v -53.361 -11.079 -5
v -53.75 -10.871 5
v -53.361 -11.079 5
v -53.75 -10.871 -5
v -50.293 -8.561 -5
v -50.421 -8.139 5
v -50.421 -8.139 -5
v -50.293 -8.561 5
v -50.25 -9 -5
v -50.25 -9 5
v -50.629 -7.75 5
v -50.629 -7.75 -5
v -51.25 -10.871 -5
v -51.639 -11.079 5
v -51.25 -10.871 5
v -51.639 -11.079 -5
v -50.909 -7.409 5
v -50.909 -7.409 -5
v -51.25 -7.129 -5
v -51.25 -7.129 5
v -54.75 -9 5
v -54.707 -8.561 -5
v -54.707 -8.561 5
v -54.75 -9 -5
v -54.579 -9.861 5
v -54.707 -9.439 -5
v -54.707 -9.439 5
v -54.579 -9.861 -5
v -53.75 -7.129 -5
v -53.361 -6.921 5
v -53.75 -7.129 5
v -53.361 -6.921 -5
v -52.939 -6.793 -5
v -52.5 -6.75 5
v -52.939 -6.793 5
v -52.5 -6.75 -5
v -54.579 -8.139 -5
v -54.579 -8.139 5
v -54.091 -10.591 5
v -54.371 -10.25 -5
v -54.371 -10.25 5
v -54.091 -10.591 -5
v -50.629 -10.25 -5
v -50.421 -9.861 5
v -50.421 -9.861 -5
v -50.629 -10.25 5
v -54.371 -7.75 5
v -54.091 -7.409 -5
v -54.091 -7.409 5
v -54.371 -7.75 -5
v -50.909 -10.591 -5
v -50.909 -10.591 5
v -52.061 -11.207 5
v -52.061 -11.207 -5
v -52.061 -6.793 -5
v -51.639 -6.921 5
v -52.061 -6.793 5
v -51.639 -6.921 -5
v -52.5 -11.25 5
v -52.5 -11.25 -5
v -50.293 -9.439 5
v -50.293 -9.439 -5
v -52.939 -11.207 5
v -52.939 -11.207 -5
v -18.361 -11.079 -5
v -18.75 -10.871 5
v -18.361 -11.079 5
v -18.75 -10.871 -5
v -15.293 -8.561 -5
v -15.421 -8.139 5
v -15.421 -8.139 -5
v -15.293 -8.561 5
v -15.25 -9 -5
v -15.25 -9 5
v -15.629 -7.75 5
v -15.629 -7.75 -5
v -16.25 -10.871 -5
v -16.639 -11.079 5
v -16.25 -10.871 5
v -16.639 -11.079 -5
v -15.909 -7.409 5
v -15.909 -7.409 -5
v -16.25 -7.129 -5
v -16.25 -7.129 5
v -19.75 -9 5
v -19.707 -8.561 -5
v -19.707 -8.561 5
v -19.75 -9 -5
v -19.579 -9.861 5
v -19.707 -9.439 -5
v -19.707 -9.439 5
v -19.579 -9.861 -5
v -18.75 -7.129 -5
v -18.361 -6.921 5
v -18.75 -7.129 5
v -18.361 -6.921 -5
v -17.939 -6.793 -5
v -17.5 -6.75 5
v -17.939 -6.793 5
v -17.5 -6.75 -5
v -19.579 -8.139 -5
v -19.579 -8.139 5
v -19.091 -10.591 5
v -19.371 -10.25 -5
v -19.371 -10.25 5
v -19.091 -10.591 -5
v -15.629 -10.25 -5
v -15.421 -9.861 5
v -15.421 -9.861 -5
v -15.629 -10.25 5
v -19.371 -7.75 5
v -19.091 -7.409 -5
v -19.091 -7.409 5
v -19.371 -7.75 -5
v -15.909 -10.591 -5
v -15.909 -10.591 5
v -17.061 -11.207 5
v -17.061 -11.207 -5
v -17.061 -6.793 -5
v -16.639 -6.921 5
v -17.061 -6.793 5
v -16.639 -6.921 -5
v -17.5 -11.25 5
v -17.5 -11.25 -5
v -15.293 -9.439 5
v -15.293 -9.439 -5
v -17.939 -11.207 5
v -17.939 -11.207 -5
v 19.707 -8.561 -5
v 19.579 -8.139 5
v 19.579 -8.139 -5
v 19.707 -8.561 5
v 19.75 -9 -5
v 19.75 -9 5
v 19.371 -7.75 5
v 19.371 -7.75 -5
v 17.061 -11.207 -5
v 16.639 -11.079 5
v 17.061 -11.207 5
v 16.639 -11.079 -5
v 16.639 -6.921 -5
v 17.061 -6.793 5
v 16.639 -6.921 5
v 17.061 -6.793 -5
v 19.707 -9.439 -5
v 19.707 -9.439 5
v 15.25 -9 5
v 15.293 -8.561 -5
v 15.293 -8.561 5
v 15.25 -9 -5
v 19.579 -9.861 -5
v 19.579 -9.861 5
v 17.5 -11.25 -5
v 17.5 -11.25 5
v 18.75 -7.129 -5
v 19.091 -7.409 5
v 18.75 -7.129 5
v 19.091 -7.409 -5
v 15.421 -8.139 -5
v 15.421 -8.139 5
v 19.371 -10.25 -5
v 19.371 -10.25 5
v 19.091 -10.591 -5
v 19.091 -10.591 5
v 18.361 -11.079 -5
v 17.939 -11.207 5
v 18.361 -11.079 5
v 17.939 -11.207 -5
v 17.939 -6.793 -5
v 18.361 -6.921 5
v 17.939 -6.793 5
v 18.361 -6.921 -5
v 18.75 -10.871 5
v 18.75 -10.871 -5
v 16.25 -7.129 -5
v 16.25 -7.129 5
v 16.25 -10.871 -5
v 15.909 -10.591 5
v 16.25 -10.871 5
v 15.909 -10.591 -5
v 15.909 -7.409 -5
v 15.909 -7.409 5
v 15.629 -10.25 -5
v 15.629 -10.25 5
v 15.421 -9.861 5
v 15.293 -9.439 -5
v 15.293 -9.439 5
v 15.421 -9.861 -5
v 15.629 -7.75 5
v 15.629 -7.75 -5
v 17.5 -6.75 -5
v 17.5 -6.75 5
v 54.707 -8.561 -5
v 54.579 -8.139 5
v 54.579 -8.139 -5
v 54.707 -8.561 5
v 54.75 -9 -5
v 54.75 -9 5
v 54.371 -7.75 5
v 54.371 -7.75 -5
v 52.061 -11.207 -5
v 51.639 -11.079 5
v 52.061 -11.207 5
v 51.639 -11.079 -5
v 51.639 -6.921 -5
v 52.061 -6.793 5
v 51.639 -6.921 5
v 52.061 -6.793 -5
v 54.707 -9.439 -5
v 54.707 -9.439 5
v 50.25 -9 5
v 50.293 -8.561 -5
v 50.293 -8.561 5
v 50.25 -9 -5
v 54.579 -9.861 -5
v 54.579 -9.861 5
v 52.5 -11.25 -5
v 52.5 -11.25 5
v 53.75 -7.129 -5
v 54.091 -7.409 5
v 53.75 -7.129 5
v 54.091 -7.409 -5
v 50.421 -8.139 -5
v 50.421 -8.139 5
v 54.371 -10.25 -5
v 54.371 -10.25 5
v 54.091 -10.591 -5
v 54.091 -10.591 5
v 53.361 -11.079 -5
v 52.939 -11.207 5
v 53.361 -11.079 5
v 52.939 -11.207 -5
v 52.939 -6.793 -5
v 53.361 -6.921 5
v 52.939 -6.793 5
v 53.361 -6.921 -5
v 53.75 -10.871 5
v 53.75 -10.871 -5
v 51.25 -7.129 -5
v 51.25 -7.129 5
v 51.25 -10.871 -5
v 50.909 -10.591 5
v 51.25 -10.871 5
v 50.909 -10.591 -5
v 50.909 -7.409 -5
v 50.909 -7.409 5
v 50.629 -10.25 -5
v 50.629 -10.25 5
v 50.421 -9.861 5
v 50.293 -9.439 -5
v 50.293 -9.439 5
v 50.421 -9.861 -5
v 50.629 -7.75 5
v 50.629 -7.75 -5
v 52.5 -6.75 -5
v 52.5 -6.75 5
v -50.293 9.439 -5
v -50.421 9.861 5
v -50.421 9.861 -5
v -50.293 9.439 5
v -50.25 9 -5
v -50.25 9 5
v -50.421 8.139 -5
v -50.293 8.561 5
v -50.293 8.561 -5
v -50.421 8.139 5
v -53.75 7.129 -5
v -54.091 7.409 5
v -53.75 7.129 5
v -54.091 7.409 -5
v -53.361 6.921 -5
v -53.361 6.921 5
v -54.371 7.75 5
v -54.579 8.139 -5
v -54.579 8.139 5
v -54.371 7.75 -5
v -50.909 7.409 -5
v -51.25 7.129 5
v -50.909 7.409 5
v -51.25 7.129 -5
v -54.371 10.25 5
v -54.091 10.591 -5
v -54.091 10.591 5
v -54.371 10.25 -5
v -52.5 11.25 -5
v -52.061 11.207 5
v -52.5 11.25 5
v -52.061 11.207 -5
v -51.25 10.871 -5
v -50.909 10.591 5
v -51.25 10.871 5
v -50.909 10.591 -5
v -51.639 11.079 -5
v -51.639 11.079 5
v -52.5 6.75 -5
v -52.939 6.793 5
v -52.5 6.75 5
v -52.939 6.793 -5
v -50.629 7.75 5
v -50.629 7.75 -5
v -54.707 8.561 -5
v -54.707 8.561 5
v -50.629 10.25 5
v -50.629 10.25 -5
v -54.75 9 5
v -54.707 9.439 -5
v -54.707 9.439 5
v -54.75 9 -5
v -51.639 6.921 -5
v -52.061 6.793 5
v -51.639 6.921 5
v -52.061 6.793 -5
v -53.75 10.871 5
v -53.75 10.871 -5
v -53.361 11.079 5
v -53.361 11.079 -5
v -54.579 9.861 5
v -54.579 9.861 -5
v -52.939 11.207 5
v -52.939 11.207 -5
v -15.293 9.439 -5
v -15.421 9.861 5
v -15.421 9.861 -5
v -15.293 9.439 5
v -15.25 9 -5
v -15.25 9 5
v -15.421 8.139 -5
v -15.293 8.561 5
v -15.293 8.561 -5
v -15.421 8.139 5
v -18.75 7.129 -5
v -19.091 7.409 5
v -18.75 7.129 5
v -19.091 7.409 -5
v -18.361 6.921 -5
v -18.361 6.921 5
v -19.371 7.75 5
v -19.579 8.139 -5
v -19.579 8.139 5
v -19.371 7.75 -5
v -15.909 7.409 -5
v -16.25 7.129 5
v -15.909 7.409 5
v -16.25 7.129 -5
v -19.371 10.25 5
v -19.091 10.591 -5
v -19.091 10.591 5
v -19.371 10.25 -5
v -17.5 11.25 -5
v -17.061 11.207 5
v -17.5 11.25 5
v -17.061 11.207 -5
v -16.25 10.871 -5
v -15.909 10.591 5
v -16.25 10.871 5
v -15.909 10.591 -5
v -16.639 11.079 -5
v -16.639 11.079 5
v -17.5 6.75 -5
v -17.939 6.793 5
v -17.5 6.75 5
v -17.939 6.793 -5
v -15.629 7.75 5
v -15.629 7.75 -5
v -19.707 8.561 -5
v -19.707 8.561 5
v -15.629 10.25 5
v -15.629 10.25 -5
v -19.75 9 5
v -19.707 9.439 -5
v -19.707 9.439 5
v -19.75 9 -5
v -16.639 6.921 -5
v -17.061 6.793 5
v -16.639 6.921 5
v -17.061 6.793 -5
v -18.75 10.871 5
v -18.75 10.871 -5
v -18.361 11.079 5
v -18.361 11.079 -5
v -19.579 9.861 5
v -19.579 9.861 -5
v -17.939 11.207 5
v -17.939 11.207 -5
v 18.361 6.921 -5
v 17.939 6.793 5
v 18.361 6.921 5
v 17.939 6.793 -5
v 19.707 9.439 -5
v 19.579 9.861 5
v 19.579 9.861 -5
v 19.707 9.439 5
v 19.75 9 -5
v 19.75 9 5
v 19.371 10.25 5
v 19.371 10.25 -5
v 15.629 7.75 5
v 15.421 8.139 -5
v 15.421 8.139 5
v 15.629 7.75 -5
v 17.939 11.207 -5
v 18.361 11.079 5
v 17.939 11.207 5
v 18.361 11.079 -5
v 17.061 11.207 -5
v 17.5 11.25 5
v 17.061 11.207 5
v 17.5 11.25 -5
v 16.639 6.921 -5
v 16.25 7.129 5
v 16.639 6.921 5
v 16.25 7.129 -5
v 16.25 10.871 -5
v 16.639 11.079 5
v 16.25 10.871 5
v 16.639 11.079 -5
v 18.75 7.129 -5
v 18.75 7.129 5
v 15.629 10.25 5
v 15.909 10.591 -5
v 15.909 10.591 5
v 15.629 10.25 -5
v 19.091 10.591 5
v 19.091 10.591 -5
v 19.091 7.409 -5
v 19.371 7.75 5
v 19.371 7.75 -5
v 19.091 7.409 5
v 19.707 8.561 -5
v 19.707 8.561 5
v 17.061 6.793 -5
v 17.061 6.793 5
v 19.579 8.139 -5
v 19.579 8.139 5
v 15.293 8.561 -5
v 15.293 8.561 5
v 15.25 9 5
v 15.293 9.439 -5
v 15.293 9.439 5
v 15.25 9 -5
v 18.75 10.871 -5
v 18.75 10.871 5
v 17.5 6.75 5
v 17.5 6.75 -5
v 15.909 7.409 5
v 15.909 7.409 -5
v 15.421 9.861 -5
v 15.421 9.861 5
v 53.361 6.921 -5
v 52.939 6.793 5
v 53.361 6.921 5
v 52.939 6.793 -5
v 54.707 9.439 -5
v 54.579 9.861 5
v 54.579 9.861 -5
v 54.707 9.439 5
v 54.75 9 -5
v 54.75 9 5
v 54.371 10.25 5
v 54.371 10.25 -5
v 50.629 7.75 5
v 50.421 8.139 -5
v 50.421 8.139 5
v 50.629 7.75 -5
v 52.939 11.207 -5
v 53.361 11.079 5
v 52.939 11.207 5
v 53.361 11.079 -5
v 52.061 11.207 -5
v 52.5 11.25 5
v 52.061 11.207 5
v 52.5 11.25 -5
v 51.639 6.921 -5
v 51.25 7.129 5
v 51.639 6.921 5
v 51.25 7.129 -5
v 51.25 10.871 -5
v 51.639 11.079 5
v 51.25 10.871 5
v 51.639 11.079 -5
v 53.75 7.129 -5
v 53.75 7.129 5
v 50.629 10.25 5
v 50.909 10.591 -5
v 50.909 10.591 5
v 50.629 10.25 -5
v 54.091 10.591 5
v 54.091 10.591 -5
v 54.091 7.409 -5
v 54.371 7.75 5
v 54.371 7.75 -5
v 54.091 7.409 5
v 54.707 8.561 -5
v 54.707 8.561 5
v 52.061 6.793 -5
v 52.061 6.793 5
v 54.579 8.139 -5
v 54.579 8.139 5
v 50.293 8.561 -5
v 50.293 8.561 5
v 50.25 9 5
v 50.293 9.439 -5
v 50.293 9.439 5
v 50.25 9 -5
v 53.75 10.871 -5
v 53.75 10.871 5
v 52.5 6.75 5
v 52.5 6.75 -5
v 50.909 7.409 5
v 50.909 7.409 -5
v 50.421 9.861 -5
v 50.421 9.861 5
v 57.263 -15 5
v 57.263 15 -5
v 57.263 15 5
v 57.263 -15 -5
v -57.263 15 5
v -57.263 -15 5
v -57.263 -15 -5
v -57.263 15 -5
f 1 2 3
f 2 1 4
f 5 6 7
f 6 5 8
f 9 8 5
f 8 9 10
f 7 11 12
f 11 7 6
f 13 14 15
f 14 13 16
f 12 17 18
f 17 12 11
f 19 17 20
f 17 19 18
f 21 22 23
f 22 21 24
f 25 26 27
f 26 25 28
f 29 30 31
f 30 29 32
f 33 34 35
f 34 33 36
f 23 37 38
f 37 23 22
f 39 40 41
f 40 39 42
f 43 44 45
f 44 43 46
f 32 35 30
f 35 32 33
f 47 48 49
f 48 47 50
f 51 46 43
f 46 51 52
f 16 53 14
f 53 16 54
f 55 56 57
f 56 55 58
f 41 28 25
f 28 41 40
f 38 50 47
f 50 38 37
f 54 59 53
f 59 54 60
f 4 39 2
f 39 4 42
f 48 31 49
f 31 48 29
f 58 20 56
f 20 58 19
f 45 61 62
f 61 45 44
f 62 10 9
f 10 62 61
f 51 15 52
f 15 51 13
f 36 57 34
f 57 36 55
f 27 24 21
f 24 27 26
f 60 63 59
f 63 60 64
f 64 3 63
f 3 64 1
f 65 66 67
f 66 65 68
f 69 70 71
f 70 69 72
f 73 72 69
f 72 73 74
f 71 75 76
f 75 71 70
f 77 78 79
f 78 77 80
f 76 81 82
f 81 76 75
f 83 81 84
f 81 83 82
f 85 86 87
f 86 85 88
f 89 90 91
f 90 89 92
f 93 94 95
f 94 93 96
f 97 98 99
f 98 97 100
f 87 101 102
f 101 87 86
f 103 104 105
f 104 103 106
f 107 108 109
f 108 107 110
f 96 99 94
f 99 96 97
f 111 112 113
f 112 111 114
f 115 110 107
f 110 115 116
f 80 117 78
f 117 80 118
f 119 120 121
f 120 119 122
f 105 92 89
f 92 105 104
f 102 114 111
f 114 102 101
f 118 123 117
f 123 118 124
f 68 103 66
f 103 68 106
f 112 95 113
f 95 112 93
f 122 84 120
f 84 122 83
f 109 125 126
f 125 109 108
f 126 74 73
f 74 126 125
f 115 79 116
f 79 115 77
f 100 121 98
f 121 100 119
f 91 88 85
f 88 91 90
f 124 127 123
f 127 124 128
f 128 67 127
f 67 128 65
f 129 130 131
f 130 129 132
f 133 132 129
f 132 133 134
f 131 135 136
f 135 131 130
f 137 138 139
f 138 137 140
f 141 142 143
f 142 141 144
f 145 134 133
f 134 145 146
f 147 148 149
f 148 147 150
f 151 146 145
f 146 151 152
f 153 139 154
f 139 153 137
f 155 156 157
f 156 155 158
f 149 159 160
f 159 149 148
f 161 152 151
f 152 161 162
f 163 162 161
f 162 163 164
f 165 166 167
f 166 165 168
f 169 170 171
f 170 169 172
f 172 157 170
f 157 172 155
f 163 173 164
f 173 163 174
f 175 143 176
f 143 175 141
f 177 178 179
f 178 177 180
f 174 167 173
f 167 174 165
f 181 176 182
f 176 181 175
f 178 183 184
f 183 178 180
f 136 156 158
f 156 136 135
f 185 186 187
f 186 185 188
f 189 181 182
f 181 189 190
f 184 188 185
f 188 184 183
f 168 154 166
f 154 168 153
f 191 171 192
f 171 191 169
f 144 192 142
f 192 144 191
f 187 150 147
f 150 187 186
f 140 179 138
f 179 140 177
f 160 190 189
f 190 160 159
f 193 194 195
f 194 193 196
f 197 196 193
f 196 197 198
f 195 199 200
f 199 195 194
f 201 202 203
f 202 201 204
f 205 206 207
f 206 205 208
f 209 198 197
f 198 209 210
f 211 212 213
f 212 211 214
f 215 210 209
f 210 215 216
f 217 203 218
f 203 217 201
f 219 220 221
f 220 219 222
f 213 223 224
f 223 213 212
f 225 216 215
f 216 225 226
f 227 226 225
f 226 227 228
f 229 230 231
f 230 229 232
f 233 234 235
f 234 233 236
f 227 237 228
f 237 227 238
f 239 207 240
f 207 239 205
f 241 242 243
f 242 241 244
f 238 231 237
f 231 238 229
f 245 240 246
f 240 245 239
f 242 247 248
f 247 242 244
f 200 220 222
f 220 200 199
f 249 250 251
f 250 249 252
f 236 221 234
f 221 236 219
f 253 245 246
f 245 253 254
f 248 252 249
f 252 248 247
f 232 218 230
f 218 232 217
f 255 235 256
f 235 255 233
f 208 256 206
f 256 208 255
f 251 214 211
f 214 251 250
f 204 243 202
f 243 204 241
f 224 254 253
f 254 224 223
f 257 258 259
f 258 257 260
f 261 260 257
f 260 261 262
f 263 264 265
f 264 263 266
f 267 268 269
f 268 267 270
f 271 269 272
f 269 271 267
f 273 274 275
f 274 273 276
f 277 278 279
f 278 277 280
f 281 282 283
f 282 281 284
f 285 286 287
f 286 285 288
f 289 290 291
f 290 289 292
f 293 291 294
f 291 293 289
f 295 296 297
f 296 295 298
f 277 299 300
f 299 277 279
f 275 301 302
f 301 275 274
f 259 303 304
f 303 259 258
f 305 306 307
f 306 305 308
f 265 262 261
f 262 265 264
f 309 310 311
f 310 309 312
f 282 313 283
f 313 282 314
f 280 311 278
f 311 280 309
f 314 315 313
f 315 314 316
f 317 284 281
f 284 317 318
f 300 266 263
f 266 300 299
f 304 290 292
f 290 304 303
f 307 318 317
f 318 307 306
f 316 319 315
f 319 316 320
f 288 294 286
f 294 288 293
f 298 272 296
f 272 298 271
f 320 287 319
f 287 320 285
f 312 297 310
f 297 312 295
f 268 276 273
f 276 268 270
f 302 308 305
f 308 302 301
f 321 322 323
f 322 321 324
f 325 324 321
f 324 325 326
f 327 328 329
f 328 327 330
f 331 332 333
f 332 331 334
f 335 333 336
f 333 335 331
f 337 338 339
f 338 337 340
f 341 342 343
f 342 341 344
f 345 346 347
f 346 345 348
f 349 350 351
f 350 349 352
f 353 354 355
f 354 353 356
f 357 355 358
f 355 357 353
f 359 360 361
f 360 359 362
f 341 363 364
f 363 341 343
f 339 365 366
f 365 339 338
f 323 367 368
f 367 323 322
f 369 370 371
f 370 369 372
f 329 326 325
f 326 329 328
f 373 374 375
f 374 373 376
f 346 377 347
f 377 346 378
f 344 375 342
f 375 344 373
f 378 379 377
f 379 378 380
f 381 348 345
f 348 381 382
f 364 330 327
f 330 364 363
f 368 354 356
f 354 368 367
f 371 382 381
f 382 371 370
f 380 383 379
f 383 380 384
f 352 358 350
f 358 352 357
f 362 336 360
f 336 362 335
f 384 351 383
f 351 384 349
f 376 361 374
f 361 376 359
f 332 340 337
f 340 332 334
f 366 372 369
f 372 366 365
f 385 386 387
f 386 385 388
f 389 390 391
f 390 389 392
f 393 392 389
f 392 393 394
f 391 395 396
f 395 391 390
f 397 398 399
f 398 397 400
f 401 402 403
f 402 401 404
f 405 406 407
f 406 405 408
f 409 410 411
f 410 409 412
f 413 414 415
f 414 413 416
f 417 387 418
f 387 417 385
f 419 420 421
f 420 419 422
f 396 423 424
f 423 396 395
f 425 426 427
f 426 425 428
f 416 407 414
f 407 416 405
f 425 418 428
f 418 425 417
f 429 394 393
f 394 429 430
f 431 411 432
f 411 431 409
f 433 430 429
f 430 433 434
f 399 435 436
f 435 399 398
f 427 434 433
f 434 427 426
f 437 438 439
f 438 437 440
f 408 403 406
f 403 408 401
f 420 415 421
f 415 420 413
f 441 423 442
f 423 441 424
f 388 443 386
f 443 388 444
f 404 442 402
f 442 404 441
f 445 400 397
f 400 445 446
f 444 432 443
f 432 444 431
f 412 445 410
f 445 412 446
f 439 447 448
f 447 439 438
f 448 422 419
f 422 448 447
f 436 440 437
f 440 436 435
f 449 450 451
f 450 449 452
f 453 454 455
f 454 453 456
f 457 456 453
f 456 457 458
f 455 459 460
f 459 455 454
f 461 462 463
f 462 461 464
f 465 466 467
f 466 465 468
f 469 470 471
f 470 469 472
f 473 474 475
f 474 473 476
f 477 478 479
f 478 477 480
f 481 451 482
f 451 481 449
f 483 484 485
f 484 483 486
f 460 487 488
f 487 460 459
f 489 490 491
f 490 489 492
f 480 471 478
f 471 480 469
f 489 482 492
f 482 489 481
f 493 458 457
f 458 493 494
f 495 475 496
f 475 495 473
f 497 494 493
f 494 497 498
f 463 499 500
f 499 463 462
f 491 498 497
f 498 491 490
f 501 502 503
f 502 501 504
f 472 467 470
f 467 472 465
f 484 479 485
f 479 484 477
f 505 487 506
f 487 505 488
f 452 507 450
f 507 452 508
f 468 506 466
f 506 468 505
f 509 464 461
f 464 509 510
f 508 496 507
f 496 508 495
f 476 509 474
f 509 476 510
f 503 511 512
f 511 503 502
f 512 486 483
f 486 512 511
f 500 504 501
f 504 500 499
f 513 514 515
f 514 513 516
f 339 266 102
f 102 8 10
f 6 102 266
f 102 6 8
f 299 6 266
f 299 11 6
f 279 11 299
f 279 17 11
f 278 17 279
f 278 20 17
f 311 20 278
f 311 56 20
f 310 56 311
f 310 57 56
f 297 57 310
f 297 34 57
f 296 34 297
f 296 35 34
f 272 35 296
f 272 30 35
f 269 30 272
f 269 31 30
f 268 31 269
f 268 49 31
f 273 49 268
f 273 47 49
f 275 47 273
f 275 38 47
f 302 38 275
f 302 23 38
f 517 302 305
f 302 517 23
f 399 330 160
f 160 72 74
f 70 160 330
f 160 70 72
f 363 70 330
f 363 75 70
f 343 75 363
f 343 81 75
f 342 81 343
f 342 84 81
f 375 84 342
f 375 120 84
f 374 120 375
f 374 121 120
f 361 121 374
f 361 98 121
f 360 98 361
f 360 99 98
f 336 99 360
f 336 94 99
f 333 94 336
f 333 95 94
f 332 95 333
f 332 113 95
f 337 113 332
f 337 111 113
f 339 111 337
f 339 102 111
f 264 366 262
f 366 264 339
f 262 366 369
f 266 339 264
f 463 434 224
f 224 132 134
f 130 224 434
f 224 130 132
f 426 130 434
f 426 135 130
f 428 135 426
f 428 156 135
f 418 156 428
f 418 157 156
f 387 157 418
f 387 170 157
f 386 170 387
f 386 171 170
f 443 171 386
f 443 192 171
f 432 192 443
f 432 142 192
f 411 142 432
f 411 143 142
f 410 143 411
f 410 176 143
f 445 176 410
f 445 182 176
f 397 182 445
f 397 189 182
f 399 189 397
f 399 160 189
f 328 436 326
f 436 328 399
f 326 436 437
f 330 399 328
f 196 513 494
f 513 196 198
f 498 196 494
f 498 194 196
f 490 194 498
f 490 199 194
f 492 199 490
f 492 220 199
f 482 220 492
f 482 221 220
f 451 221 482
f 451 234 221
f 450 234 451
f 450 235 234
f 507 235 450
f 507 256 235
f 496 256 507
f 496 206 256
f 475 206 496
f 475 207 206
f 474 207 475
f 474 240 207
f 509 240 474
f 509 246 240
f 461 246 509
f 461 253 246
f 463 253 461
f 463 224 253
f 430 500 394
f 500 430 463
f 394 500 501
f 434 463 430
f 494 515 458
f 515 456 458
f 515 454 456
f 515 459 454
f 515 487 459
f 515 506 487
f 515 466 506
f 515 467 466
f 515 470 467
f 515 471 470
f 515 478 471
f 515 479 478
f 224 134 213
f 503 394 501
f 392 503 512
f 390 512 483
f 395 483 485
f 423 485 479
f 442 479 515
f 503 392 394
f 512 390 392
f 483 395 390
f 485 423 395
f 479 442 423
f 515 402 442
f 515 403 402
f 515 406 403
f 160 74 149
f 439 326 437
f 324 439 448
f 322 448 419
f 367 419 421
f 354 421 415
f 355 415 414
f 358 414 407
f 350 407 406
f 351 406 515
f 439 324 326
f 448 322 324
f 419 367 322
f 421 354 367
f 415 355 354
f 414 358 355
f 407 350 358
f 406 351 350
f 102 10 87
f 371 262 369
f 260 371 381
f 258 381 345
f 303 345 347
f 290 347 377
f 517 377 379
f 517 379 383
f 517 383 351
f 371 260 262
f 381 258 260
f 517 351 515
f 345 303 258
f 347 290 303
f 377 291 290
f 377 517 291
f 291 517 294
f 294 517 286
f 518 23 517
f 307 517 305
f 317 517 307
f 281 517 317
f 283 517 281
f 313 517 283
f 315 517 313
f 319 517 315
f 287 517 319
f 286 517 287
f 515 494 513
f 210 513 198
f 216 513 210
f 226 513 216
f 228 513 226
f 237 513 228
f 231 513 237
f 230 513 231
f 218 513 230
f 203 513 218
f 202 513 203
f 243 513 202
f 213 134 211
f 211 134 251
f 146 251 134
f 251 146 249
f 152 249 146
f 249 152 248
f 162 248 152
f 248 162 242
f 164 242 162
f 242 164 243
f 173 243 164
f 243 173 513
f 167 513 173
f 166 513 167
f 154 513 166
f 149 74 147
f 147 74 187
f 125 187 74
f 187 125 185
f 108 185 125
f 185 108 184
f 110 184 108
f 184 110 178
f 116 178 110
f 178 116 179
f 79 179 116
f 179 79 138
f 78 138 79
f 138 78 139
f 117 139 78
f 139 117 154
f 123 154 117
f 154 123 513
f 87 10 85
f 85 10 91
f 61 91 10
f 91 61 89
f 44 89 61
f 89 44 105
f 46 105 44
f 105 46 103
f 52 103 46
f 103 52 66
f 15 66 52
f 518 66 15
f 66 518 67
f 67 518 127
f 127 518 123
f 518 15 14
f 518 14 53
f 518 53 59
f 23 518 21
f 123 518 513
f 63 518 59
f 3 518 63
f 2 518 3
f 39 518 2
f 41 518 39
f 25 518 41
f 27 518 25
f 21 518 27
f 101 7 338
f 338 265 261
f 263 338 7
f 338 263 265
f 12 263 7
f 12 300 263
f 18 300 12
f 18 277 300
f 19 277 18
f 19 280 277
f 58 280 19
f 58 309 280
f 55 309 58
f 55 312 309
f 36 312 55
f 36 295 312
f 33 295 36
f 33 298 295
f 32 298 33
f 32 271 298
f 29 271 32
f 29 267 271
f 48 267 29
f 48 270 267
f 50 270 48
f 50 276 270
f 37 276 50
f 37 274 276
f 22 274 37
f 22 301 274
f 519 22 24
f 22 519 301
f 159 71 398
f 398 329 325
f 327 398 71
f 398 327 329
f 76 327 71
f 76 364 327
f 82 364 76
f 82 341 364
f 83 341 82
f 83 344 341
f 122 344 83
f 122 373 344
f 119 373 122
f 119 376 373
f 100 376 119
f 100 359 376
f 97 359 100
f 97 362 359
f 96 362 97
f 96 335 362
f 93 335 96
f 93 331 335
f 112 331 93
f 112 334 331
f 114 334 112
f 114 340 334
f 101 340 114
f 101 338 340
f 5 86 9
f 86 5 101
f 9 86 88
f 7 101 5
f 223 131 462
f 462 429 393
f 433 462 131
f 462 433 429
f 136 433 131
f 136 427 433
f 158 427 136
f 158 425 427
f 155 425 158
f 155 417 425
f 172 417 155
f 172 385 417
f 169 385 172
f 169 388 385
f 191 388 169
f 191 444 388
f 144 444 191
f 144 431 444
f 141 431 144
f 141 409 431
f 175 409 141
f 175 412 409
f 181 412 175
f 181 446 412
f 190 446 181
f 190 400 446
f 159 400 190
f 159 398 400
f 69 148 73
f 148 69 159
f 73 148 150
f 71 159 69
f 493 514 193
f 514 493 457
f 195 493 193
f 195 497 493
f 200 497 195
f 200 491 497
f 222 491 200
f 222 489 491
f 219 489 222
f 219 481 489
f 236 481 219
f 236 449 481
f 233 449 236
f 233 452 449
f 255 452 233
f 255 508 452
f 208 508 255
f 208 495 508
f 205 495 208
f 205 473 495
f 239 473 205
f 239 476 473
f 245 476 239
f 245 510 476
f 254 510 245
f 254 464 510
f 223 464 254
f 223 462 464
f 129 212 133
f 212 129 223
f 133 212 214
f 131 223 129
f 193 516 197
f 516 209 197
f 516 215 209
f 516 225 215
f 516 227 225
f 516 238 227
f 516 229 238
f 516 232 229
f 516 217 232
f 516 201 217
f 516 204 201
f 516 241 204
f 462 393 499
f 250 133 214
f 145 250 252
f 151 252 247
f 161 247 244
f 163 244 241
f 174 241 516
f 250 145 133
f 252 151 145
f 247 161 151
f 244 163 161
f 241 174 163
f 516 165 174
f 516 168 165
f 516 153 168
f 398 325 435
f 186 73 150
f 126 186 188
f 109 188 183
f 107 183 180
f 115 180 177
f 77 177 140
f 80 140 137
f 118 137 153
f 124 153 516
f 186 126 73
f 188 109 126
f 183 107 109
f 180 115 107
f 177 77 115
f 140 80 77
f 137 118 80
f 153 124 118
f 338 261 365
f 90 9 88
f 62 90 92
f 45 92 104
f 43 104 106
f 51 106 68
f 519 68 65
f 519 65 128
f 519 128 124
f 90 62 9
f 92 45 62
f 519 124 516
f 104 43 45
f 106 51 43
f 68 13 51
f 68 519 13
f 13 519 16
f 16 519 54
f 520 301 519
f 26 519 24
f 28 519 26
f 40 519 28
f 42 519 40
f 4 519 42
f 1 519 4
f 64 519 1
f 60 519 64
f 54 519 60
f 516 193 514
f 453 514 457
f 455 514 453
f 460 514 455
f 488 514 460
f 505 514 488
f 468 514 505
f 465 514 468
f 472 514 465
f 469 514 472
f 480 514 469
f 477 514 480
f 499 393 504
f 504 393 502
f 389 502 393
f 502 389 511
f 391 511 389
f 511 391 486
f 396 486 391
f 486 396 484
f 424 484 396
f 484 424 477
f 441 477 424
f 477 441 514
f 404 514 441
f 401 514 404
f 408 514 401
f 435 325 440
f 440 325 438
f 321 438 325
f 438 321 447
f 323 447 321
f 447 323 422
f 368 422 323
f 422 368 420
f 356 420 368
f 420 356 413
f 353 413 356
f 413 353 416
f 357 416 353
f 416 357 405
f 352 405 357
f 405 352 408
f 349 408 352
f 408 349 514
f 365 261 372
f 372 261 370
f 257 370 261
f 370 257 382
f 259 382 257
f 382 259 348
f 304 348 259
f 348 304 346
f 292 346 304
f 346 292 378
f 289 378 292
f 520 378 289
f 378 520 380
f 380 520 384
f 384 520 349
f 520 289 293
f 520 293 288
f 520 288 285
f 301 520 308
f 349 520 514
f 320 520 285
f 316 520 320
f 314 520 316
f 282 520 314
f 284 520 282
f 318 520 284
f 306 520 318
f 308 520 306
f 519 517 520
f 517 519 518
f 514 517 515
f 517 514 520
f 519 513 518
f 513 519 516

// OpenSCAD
$fn = 32;

// ----------------------------------------------------------------------
// Hole bar, 4 x Ø4.5
// tworows layout, 4.7625 mm edge offset
// ----------------------------------------------------------------------

// --- parameters (mm) ---
bar_w = 30;       // bar width (Y)
bar_t = 10;       // bar thickness (Z)
holes = 4;        // holes per row
hole_d = 4.5;     // hole diameter
edge = 4.763;     // offset from the bar end to the first hole
pitch = 35;       // pitch between neighbouring holes
row_offset = 18;  // distance between the two rows

// --- derived feature positions (mm) ---
span = (holes - 1) * pitch;   // = 105   distance between the end holes
bar_l = span + 2 * edge;      // = 114.53   overall bar length
start_x = -bar_l / 2 + edge;  // = -52.5   X of the first hole
feature_centers = [
  [start_x + 0 * pitch, -row_offset / 2],
  [start_x + 1 * pitch, -row_offset / 2],
  [start_x + 2 * pitch, -row_offset / 2],
  [start_x + 3 * pitch, -row_offset / 2]
];   // hole centres of the first row
row2_centers = [
  [start_x + 0 * pitch, row_offset / 2],
  [start_x + 1 * pitch, row_offset / 2],
  [start_x + 2 * pitch, row_offset / 2],
  [start_x + 3 * pitch, row_offset / 2]
];   // hole centres of the second row

// bar with two rows of holes, both read from their own centre arrays
difference() {
  translate([-bar_l / 2, -bar_w / 2, -bar_t / 2]) cube([bar_l, bar_w, bar_t]);
  for (centre = feature_centers)
    translate([centre[0], centre[1], 0])
      cylinder(d = hole_d, h = bar_t + 2, center = true);
  for (centre = row2_centers)
    translate([centre[0], centre[1], 0])
      cylinder(d = hole_d, h = bar_t + 2, center = true);
}
